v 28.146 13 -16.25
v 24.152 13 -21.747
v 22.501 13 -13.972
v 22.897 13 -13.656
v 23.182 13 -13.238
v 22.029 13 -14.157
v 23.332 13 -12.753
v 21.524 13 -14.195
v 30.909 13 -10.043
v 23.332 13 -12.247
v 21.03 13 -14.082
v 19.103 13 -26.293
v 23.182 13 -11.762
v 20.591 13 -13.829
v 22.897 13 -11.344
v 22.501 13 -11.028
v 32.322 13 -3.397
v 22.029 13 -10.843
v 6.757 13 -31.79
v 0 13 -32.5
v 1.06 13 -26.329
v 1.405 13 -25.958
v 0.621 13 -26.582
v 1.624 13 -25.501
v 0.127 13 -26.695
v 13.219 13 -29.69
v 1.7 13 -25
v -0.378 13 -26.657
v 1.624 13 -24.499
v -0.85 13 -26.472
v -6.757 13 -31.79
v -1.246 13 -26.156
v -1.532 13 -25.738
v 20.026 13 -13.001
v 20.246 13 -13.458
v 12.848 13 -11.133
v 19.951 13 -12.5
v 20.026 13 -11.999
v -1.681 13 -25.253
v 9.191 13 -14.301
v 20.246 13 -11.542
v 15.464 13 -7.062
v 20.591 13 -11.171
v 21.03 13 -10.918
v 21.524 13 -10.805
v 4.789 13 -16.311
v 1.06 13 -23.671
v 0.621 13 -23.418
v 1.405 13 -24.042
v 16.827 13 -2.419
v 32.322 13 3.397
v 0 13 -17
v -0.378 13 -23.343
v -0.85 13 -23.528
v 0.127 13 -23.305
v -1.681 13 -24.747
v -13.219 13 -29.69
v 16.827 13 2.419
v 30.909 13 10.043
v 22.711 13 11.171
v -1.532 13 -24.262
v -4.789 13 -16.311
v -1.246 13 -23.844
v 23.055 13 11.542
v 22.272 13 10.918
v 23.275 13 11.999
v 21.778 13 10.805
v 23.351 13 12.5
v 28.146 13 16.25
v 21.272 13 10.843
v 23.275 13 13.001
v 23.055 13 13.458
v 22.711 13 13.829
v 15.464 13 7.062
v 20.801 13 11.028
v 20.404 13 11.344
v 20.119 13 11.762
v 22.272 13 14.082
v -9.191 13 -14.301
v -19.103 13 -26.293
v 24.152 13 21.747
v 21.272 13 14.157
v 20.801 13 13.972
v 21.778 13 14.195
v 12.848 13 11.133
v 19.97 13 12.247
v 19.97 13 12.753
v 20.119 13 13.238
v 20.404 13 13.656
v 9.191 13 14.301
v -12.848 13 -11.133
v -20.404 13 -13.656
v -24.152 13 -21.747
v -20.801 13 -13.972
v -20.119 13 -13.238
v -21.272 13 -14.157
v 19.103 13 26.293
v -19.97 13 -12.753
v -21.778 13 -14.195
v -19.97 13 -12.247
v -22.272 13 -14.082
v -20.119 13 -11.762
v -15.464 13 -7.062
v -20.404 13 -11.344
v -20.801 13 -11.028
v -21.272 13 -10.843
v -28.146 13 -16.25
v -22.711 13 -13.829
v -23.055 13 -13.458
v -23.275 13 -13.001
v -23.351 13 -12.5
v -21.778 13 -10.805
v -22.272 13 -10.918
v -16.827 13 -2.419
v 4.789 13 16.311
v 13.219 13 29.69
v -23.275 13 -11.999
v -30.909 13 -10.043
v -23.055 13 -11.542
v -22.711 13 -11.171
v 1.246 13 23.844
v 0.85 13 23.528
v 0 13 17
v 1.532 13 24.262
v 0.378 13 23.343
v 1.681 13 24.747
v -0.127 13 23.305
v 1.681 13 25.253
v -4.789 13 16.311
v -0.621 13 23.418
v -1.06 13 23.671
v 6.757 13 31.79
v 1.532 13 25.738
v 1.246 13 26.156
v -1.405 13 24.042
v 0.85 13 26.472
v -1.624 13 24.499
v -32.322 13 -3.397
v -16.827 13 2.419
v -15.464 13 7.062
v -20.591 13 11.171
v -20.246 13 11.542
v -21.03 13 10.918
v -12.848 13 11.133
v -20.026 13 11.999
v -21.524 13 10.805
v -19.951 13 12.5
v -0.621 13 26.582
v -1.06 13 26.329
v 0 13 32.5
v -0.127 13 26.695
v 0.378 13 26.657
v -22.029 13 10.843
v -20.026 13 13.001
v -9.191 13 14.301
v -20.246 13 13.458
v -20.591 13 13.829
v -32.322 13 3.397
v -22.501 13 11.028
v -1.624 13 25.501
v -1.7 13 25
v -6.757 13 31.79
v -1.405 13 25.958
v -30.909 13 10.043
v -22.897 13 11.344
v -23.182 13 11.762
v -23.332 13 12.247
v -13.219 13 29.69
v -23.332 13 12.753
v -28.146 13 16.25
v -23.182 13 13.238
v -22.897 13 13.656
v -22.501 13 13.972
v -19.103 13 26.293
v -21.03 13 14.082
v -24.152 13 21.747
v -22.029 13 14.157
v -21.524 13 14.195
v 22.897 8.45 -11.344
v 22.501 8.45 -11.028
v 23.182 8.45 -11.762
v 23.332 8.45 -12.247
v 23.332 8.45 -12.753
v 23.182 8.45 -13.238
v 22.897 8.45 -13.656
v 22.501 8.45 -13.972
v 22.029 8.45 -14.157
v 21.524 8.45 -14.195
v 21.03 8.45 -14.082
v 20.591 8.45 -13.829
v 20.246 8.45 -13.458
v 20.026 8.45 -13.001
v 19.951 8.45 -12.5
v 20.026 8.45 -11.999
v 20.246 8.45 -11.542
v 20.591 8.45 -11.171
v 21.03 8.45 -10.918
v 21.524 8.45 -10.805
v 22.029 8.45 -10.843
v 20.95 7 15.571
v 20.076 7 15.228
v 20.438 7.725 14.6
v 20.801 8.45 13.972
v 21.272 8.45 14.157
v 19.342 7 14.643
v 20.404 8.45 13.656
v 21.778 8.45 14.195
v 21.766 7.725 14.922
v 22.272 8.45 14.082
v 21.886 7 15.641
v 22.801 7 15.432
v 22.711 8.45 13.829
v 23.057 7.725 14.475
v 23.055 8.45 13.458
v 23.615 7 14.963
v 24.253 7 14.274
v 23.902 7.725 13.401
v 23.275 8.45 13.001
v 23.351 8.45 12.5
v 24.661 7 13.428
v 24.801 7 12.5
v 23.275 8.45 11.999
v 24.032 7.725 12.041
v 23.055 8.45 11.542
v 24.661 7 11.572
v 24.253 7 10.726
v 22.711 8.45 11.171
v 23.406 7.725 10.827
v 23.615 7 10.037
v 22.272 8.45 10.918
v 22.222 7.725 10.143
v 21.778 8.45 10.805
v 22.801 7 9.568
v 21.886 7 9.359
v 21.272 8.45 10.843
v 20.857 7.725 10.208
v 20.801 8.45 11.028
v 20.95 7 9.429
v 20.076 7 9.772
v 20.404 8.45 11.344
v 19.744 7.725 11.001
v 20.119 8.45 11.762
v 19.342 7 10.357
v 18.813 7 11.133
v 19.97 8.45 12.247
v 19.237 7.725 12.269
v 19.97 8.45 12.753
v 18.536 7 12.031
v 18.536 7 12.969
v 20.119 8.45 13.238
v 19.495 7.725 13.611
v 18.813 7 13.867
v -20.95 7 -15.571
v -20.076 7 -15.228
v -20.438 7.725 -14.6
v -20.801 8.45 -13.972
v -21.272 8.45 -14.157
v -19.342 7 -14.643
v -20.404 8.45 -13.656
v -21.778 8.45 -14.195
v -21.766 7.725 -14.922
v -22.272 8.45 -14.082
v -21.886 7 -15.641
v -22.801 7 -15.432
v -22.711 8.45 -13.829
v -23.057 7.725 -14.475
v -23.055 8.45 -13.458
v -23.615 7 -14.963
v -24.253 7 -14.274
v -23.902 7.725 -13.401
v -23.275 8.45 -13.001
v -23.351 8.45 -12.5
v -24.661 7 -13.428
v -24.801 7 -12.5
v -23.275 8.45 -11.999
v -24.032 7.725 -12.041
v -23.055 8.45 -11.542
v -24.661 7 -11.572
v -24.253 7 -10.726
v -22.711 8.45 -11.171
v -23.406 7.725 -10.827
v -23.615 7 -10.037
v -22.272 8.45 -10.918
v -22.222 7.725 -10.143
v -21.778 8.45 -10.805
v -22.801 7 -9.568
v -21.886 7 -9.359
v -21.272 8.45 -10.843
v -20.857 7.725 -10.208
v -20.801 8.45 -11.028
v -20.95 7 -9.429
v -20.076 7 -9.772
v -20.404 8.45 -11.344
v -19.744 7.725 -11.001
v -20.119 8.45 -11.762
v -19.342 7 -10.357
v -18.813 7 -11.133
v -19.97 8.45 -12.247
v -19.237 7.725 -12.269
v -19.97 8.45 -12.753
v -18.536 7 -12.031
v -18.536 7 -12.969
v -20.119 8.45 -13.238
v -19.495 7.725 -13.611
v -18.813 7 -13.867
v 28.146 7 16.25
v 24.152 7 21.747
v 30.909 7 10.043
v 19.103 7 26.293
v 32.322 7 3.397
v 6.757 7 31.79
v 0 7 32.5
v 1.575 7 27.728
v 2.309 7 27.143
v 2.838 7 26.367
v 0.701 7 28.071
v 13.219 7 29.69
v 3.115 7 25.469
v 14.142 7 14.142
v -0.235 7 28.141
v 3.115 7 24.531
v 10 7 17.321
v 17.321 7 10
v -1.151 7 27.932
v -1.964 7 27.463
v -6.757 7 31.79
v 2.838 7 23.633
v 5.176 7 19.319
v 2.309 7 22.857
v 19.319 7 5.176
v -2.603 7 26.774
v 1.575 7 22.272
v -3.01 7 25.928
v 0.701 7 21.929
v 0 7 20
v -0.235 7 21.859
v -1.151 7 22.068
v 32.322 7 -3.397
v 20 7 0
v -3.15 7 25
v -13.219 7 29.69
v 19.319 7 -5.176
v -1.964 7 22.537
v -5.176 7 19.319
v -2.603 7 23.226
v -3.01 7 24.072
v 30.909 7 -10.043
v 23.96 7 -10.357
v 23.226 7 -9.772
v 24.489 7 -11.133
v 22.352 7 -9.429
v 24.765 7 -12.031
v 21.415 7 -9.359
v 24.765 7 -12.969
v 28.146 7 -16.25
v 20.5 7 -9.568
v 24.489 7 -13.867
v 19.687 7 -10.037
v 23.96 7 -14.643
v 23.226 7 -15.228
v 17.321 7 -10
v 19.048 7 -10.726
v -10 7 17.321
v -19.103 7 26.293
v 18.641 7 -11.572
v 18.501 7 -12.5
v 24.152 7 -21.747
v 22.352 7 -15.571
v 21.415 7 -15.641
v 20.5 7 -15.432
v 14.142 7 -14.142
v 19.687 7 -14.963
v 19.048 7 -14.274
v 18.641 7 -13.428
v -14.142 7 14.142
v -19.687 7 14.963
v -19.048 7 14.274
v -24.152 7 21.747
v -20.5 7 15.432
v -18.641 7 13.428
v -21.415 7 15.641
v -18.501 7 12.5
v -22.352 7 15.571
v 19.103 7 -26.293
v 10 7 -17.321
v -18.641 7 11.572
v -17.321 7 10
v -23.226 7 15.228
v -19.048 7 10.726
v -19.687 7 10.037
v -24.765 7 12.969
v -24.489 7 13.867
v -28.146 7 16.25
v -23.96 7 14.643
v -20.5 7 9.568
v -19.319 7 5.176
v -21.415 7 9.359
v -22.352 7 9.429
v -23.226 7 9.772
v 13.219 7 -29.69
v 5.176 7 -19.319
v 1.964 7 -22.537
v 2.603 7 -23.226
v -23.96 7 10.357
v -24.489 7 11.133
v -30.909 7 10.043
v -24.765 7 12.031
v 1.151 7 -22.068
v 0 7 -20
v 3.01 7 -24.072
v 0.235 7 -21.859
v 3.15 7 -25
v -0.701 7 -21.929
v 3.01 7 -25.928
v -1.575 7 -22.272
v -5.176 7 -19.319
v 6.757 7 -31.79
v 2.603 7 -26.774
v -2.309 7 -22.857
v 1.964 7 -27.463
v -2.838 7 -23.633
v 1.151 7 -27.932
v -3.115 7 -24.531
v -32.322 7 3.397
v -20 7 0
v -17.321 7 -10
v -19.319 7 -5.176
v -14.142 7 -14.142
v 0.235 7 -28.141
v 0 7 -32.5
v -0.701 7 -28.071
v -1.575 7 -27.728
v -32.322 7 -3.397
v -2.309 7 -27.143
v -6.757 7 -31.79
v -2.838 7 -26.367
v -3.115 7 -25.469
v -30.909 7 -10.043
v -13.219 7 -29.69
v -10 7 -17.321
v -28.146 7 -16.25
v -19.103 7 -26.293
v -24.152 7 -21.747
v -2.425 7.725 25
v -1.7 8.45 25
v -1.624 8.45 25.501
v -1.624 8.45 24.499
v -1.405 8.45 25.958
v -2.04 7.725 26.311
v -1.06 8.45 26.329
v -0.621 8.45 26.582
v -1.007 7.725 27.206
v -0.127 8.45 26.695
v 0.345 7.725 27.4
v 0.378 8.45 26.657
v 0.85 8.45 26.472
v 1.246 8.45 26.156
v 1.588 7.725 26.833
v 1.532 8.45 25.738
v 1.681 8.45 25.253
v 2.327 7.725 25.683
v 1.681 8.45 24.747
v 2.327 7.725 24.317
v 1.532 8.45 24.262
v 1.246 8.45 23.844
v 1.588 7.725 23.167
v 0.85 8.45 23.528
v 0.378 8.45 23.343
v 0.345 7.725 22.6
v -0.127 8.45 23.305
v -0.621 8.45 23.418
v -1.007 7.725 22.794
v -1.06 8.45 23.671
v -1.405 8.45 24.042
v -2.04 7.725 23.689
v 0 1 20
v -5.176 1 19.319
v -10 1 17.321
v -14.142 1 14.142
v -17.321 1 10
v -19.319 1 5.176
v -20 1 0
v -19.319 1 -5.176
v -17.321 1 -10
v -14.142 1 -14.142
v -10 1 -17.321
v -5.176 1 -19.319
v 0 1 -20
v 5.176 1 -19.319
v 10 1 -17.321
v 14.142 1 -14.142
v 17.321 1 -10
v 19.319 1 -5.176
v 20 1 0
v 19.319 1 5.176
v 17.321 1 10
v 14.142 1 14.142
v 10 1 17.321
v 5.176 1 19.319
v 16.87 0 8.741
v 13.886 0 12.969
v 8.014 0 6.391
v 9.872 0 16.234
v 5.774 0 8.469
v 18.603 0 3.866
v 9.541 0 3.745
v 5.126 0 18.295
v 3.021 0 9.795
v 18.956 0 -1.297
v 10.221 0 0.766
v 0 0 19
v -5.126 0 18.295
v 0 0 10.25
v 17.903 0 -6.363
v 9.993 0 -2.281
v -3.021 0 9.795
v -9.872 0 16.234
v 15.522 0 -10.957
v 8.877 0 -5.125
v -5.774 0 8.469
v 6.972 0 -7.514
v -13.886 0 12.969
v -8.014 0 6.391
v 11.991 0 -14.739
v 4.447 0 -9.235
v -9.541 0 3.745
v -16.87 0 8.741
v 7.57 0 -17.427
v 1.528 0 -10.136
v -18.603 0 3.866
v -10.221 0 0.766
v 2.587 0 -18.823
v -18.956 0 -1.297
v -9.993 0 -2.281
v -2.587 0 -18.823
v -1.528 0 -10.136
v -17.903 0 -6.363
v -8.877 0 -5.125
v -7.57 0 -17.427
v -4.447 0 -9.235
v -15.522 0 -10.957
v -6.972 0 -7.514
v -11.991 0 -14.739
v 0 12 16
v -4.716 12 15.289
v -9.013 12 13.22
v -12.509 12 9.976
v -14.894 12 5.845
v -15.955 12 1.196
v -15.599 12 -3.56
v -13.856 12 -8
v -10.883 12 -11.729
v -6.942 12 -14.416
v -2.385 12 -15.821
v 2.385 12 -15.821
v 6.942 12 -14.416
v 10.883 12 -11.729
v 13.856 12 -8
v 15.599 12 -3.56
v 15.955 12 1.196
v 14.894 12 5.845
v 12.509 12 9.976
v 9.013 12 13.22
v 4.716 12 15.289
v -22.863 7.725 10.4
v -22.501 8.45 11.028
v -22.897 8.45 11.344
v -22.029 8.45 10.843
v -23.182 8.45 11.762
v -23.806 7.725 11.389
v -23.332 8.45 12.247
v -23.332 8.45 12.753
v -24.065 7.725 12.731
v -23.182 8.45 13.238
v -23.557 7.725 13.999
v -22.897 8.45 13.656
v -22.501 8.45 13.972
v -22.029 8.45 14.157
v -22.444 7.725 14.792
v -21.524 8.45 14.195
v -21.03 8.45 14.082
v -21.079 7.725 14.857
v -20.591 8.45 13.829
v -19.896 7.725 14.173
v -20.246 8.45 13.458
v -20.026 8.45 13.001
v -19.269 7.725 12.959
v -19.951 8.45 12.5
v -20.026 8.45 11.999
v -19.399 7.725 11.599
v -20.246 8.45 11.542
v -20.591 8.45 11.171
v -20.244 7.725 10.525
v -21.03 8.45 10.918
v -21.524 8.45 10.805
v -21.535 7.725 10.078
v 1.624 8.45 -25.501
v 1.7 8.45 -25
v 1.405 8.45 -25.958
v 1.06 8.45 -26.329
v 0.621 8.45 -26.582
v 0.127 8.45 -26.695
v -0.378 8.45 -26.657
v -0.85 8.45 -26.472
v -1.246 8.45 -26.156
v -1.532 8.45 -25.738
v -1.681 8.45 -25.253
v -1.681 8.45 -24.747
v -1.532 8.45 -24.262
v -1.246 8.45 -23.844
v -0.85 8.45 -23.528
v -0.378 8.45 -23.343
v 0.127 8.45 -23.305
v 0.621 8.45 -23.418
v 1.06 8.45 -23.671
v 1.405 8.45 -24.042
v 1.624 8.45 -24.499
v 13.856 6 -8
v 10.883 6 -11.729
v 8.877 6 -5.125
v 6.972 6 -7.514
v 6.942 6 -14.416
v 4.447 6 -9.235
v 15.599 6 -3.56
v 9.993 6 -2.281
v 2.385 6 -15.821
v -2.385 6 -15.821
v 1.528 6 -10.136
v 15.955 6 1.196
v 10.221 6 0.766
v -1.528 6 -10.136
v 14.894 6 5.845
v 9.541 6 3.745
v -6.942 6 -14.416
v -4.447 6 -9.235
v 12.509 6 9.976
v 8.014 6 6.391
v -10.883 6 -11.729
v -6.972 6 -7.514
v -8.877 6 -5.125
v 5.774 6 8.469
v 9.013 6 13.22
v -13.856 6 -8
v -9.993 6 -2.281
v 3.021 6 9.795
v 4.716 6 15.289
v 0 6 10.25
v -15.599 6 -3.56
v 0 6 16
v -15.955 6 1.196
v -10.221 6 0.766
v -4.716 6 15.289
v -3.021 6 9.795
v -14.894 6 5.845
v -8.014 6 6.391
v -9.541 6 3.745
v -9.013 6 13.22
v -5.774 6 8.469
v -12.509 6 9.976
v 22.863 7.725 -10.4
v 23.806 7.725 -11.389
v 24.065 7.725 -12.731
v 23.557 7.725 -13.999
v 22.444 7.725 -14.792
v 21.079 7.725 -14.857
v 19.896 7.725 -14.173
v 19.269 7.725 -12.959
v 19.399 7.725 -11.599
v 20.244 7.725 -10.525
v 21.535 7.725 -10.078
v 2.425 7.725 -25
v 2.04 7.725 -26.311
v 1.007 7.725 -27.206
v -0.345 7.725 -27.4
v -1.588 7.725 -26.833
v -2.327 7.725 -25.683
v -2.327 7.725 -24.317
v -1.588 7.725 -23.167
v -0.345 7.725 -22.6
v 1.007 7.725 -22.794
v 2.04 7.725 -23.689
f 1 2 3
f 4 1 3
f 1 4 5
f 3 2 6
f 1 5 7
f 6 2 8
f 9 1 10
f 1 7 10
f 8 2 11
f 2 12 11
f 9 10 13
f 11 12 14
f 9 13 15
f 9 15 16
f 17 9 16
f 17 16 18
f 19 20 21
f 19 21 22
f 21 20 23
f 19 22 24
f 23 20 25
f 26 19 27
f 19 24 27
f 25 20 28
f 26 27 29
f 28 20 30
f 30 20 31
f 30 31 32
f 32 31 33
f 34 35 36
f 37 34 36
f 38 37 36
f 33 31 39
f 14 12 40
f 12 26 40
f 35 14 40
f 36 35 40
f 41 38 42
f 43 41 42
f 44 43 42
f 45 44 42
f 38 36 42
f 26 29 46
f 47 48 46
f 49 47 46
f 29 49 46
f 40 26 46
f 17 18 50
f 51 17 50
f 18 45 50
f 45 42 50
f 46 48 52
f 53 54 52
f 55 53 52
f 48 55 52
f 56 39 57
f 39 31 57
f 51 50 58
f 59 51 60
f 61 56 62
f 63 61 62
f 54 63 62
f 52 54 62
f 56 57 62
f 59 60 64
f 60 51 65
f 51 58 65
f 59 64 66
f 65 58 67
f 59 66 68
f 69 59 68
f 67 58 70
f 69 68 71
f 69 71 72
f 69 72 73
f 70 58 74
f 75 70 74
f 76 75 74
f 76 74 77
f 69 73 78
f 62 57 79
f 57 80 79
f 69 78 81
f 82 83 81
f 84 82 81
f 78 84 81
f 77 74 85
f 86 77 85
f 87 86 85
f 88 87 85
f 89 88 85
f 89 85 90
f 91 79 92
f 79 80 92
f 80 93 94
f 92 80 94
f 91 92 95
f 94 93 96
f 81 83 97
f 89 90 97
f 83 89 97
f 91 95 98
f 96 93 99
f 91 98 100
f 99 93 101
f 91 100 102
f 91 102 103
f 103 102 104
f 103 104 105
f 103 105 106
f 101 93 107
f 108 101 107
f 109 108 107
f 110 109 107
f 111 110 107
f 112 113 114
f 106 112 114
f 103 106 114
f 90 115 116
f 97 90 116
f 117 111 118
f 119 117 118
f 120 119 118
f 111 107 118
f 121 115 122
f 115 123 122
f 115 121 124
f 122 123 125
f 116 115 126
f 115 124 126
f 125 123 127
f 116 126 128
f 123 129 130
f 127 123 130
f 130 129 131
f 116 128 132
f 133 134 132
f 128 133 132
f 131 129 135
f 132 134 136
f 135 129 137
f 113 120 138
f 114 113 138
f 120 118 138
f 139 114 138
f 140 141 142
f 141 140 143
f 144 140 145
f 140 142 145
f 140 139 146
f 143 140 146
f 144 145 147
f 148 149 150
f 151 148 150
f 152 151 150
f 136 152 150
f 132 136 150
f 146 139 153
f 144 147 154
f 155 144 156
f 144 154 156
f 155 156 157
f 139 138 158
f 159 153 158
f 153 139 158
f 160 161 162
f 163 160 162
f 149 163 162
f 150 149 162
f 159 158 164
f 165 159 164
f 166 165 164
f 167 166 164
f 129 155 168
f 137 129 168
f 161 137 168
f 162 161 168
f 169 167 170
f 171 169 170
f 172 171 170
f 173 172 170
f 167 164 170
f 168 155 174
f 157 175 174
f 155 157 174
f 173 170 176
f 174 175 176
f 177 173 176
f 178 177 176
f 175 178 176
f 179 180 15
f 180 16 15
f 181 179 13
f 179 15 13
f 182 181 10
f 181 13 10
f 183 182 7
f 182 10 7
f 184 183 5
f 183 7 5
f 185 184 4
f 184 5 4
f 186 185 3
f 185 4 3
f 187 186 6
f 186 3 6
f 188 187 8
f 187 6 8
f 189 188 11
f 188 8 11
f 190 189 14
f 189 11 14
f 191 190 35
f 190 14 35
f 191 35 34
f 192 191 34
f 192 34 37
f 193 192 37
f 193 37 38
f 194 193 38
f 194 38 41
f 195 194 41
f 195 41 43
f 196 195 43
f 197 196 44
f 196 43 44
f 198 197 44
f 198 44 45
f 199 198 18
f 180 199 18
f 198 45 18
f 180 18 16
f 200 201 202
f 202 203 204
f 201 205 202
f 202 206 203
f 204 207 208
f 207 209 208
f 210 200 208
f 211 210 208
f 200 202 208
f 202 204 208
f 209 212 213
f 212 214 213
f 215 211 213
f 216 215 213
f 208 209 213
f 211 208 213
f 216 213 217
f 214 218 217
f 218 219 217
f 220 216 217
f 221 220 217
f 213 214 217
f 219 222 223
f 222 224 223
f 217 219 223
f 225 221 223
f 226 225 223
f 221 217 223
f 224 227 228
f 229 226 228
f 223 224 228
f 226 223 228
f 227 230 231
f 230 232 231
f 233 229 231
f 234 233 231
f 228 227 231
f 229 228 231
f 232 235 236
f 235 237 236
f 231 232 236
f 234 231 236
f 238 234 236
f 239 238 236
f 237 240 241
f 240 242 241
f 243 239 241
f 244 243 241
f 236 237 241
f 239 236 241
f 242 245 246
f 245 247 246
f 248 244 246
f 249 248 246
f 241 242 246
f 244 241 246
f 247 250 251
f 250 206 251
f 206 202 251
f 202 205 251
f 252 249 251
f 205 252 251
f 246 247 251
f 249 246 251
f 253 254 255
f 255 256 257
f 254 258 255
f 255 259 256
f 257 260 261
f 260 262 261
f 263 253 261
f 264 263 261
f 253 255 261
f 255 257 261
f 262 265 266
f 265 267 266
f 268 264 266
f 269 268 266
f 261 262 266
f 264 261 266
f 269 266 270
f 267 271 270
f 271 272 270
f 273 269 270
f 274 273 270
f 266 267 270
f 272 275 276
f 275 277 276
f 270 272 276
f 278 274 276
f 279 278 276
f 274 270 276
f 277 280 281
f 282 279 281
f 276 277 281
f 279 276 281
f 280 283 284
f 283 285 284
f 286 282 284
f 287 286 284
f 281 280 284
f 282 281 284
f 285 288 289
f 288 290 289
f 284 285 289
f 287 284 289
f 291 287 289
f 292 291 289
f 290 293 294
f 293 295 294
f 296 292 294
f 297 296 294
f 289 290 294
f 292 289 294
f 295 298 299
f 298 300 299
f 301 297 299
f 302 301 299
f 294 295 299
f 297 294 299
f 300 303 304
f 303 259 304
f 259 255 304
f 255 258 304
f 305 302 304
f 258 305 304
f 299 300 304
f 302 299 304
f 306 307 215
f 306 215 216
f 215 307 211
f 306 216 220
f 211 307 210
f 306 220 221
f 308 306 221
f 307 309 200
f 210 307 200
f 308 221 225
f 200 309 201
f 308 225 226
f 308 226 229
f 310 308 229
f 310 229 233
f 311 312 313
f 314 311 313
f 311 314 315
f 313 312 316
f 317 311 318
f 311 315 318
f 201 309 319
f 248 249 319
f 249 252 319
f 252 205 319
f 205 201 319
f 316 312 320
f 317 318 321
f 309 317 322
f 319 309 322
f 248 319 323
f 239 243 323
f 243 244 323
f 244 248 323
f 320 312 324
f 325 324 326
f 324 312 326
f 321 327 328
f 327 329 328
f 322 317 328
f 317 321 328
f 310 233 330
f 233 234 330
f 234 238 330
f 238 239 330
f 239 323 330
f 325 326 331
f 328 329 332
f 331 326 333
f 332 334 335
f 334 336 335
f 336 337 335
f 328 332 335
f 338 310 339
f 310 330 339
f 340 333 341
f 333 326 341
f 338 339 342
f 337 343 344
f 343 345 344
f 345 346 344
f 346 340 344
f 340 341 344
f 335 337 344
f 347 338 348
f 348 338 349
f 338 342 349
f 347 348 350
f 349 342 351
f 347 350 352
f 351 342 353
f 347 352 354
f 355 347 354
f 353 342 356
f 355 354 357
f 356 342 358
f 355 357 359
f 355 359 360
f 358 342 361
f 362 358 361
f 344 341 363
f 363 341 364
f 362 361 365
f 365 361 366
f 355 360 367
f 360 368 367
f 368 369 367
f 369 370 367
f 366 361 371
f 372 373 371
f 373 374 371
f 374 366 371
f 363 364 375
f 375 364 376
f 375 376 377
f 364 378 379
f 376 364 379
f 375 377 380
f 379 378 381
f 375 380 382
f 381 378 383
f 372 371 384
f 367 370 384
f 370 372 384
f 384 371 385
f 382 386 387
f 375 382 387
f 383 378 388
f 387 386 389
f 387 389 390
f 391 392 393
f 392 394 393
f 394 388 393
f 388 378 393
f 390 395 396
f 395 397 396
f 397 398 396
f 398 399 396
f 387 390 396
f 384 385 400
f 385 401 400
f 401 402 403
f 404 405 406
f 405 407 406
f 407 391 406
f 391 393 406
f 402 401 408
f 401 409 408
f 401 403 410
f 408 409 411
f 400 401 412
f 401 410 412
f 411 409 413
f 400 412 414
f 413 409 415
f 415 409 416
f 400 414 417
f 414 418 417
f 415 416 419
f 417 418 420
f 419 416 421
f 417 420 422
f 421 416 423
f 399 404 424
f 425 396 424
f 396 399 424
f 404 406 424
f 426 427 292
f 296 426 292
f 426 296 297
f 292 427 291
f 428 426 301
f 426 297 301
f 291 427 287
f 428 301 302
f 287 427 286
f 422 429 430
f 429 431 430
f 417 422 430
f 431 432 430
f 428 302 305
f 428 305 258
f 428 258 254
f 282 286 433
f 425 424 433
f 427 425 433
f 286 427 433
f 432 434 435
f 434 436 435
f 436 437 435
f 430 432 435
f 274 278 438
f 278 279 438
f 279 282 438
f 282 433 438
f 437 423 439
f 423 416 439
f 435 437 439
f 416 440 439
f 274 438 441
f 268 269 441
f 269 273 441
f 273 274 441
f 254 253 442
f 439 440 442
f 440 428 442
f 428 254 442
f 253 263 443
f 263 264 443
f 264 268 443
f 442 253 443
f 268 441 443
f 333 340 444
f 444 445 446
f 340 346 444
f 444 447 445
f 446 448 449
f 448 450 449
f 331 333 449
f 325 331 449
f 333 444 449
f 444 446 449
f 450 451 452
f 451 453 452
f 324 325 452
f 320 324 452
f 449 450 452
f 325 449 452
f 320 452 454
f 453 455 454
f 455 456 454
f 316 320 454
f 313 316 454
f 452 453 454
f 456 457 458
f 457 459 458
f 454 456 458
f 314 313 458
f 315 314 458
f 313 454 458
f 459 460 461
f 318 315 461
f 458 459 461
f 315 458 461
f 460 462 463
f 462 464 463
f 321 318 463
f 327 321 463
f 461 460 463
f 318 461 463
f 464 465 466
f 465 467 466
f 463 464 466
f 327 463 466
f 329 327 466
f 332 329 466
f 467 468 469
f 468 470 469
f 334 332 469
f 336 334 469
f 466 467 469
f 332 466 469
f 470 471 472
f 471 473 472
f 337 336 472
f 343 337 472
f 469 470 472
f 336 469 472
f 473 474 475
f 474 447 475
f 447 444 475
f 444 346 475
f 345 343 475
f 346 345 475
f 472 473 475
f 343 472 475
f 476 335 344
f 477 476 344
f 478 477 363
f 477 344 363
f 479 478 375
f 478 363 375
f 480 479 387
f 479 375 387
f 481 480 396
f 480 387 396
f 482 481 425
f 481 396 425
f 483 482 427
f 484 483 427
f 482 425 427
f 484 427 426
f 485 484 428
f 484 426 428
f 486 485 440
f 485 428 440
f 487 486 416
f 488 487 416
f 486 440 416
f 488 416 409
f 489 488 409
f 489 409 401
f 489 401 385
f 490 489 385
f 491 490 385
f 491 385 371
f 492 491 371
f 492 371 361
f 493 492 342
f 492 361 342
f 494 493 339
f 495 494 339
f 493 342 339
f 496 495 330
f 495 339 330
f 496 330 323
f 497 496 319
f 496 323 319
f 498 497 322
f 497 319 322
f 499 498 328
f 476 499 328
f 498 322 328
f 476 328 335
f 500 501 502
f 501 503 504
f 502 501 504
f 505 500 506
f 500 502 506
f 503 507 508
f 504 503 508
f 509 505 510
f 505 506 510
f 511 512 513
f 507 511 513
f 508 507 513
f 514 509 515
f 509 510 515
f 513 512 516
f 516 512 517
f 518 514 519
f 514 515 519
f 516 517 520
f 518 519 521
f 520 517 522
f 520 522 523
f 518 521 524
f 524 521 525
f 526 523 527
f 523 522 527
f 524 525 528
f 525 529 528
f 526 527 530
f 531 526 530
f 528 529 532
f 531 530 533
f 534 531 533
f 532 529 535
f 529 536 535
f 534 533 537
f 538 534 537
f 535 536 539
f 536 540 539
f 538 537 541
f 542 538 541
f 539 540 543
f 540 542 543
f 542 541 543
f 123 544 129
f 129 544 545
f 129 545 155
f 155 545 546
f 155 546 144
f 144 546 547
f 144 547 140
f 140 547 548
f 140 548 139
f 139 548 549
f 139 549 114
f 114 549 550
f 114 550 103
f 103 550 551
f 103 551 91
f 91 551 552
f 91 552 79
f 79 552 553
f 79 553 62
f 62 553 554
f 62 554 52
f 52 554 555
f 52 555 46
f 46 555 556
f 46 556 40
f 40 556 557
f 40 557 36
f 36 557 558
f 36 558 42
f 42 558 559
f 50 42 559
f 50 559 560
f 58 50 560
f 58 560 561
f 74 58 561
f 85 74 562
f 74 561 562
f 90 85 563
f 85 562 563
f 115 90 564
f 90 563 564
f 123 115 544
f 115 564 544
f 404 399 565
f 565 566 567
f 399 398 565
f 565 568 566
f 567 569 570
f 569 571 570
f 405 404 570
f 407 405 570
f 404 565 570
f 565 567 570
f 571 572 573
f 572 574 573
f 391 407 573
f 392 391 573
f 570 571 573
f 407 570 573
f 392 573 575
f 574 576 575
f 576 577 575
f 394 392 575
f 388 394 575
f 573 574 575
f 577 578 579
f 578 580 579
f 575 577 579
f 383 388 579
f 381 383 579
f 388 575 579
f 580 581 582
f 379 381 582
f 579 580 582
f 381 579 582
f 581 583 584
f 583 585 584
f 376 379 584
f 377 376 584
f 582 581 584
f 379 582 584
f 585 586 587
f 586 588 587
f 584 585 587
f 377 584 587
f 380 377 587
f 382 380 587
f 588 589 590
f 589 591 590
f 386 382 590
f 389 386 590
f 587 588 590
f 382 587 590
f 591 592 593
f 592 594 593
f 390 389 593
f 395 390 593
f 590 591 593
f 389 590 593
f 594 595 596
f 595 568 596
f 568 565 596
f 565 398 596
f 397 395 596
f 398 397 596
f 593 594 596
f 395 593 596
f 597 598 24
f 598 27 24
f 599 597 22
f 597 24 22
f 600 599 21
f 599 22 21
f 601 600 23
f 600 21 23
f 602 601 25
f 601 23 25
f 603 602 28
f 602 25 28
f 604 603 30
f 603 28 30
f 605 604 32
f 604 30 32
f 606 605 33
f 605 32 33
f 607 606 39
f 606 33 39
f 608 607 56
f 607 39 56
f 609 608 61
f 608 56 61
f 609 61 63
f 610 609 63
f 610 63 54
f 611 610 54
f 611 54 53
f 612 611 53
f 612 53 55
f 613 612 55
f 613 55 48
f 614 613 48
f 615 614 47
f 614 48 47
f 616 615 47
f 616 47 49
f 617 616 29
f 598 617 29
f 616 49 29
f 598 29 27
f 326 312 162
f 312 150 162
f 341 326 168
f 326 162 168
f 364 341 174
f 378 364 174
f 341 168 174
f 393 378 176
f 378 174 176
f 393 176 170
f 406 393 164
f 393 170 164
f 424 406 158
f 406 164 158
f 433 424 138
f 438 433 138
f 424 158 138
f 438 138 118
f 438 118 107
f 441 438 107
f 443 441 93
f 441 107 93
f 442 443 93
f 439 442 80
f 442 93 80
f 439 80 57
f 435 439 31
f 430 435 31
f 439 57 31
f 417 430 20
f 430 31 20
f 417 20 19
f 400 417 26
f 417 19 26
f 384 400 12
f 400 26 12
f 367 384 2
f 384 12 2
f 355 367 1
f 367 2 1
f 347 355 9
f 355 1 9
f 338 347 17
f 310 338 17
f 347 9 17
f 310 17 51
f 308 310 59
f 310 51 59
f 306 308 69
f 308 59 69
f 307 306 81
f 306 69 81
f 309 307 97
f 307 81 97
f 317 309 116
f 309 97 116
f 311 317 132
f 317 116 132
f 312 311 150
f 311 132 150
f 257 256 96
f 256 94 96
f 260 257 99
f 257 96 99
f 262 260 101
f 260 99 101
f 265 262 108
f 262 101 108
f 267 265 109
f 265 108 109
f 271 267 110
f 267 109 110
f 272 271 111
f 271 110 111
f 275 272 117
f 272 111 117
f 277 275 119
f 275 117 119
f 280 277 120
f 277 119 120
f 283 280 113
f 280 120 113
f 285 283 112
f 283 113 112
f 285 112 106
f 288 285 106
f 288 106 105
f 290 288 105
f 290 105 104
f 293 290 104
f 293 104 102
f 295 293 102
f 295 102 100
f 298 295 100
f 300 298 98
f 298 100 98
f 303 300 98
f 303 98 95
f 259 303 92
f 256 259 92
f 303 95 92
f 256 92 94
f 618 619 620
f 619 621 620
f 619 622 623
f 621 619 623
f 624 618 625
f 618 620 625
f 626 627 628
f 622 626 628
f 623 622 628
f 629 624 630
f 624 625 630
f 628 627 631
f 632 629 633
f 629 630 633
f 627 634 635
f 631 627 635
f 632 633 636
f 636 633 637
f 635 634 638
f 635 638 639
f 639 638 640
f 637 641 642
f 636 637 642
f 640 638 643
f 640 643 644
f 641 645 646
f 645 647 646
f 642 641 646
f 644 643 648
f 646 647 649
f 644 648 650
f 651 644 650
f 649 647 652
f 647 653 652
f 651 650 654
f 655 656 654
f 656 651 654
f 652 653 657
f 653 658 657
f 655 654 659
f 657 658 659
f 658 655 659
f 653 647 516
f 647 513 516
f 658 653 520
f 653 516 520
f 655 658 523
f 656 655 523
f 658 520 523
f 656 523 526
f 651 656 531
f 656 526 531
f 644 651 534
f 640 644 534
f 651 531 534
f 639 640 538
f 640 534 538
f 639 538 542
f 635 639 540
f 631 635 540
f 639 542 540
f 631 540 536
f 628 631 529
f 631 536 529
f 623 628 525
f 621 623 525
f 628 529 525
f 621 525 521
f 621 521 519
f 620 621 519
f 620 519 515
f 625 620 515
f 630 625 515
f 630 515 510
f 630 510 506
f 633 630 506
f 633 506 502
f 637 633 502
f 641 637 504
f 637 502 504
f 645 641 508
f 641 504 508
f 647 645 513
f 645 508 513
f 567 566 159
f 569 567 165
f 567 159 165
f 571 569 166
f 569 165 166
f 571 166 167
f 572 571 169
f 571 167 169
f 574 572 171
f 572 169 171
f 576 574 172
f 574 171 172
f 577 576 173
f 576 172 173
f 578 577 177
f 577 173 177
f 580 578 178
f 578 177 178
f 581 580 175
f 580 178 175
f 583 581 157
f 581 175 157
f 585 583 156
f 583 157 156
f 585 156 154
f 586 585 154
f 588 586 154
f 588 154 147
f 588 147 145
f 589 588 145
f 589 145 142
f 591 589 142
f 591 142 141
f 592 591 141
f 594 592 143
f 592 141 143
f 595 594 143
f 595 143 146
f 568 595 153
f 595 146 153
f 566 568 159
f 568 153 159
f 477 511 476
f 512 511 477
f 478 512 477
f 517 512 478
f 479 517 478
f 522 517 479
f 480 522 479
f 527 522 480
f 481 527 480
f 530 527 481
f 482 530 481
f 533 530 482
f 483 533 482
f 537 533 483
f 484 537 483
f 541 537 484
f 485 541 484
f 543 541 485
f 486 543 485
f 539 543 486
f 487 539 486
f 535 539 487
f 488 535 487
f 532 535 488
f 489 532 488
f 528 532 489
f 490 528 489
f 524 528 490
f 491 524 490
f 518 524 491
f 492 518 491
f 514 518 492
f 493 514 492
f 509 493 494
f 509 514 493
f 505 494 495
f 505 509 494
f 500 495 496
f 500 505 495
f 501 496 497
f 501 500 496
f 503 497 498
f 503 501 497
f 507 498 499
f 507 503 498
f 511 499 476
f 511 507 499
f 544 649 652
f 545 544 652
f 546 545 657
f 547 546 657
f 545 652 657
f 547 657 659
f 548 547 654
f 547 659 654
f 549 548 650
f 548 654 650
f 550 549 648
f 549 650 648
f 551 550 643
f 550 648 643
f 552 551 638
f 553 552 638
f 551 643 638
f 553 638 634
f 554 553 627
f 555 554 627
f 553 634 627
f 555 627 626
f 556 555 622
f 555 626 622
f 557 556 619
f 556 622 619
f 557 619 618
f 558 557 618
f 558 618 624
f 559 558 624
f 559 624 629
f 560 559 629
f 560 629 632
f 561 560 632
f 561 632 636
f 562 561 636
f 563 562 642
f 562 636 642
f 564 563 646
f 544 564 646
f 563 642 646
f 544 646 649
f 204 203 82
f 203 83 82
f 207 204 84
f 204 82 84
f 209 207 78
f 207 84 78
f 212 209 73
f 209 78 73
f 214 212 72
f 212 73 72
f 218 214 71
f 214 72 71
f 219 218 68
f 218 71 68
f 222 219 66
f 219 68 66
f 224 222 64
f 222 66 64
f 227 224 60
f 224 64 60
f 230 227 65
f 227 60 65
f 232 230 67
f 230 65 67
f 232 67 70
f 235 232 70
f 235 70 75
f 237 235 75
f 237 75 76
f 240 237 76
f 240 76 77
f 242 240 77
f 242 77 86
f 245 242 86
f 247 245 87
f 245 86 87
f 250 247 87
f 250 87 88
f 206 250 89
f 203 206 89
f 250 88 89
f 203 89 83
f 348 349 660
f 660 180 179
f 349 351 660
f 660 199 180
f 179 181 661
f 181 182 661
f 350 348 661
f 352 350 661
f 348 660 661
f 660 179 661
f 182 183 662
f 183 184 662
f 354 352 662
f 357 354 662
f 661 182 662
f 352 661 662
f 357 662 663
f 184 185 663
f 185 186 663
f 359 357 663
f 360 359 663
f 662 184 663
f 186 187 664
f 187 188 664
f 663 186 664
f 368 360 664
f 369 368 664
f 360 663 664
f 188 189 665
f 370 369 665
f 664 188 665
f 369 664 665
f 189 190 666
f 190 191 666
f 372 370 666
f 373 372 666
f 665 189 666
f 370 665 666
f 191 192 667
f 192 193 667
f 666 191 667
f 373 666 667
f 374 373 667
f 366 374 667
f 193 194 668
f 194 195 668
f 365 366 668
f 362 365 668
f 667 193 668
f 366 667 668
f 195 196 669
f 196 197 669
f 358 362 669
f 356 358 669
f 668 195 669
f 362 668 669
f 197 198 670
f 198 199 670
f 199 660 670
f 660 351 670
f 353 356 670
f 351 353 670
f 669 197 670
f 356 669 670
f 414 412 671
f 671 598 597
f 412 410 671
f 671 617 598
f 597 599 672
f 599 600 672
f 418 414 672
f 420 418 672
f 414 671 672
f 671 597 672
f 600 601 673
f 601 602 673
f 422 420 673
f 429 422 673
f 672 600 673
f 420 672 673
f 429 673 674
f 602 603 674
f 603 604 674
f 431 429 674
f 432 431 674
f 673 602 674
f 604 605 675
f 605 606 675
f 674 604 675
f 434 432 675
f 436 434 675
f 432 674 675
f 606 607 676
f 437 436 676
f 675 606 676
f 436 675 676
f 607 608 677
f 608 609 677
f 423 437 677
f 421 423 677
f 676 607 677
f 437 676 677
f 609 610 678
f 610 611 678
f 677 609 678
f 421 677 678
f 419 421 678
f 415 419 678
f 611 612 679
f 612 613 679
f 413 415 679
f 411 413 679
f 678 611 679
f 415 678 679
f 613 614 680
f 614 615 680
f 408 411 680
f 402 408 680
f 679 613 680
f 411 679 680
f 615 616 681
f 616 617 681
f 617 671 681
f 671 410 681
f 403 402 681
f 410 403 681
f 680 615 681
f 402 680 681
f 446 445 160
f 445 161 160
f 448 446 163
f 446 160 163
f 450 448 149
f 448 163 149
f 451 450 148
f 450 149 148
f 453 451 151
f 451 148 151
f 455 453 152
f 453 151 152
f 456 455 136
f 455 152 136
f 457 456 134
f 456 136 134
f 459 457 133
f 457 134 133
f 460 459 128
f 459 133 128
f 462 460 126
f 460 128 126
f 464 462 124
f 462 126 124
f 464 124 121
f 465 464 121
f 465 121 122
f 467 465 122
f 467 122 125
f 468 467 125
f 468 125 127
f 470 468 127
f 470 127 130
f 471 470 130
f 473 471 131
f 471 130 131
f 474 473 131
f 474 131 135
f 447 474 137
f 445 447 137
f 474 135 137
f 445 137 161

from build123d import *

# Parameters (mm, degrees)
FASE1_SIZE                                           = 1
FASE2_SIZE                                           = 1
FORMSENKUNG_F_R_M3_SENKSCHRAUBE_MIT_SCHL_D           = 3.4
FORMSENKUNG_F_R_M3_SENKSCHRAUBE_MIT_SCHL_CSINK_D     = 6.3
FORMSENKUNG_F_R_M3_SENKSCHRAUBE_MIT_SCHL_CSINK_ANGLE = 90
KREISMUSTER1_COUNT                                   = 6


with BuildPart() as part:
    # Skizze1 → Rotation1 (revolve)
    with BuildSketch(Plane.XY, mode=Mode.PRIVATE) as rotation1_sk:
        Polygon((10.25, 0), (20, 0), (20, 7), (32.5, 7), (32.5, 13), (16, 13), (16, 6), (10.25, 6), align=None)
    revolve(rotation1_sk.sketch.rotate(Axis((0, 0, 0), (0, -1, 0)), 90), axis=Axis((0, 0, 0), (0, -1, 0)))

    # Fase1
    fase1_edges = [part.edges().sort_by_distance(p)[0] for p in [
        (0, 13, -16),
    ]]
    chamfer(fase1_edges, length=FASE1_SIZE)

    # Fase2
    fase2_edges = [part.edges().sort_by_distance(p)[0] for p in [
        (0, 0, -20),
    ]]
    chamfer(fase2_edges, length=FASE2_SIZE)

    # Formsenkung für M3 Senkschraube mit Schlitz/Kreuzschlitz1 (through all)
    with Locations(Plane(origin=(0, 7, 0), x_dir=(-1, 0, 0), z_dir=(0, -1, 0))):
        with Locations((0, 25)):
            formsenkung_f_r_m3_senkschraube_mit_schl = CounterSinkHole(FORMSENKUNG_F_R_M3_SENKSCHRAUBE_MIT_SCHL_D / 2, FORMSENKUNG_F_R_M3_SENKSCHRAUBE_MIT_SCHL_CSINK_D / 2, counter_sink_angle=FORMSENKUNG_F_R_M3_SENKSCHRAUBE_MIT_SCHL_CSINK_ANGLE)

    # Kreismuster1: Formsenkung für M3 Senkschraube mit Schlitz/Kreuzschlitz1 ×6 about axis
    kreismuster1_axis = Axis((0, 0, 0), (0, 1, 0))
    for i in range(1, KREISMUSTER1_COUNT):
        add(formsenkung_f_r_m3_senkschraube_mit_schl.rotate(kreismuster1_axis, i * 360 / KREISMUSTER1_COUNT), mode=Mode.SUBTRACT)


solid = part.part
